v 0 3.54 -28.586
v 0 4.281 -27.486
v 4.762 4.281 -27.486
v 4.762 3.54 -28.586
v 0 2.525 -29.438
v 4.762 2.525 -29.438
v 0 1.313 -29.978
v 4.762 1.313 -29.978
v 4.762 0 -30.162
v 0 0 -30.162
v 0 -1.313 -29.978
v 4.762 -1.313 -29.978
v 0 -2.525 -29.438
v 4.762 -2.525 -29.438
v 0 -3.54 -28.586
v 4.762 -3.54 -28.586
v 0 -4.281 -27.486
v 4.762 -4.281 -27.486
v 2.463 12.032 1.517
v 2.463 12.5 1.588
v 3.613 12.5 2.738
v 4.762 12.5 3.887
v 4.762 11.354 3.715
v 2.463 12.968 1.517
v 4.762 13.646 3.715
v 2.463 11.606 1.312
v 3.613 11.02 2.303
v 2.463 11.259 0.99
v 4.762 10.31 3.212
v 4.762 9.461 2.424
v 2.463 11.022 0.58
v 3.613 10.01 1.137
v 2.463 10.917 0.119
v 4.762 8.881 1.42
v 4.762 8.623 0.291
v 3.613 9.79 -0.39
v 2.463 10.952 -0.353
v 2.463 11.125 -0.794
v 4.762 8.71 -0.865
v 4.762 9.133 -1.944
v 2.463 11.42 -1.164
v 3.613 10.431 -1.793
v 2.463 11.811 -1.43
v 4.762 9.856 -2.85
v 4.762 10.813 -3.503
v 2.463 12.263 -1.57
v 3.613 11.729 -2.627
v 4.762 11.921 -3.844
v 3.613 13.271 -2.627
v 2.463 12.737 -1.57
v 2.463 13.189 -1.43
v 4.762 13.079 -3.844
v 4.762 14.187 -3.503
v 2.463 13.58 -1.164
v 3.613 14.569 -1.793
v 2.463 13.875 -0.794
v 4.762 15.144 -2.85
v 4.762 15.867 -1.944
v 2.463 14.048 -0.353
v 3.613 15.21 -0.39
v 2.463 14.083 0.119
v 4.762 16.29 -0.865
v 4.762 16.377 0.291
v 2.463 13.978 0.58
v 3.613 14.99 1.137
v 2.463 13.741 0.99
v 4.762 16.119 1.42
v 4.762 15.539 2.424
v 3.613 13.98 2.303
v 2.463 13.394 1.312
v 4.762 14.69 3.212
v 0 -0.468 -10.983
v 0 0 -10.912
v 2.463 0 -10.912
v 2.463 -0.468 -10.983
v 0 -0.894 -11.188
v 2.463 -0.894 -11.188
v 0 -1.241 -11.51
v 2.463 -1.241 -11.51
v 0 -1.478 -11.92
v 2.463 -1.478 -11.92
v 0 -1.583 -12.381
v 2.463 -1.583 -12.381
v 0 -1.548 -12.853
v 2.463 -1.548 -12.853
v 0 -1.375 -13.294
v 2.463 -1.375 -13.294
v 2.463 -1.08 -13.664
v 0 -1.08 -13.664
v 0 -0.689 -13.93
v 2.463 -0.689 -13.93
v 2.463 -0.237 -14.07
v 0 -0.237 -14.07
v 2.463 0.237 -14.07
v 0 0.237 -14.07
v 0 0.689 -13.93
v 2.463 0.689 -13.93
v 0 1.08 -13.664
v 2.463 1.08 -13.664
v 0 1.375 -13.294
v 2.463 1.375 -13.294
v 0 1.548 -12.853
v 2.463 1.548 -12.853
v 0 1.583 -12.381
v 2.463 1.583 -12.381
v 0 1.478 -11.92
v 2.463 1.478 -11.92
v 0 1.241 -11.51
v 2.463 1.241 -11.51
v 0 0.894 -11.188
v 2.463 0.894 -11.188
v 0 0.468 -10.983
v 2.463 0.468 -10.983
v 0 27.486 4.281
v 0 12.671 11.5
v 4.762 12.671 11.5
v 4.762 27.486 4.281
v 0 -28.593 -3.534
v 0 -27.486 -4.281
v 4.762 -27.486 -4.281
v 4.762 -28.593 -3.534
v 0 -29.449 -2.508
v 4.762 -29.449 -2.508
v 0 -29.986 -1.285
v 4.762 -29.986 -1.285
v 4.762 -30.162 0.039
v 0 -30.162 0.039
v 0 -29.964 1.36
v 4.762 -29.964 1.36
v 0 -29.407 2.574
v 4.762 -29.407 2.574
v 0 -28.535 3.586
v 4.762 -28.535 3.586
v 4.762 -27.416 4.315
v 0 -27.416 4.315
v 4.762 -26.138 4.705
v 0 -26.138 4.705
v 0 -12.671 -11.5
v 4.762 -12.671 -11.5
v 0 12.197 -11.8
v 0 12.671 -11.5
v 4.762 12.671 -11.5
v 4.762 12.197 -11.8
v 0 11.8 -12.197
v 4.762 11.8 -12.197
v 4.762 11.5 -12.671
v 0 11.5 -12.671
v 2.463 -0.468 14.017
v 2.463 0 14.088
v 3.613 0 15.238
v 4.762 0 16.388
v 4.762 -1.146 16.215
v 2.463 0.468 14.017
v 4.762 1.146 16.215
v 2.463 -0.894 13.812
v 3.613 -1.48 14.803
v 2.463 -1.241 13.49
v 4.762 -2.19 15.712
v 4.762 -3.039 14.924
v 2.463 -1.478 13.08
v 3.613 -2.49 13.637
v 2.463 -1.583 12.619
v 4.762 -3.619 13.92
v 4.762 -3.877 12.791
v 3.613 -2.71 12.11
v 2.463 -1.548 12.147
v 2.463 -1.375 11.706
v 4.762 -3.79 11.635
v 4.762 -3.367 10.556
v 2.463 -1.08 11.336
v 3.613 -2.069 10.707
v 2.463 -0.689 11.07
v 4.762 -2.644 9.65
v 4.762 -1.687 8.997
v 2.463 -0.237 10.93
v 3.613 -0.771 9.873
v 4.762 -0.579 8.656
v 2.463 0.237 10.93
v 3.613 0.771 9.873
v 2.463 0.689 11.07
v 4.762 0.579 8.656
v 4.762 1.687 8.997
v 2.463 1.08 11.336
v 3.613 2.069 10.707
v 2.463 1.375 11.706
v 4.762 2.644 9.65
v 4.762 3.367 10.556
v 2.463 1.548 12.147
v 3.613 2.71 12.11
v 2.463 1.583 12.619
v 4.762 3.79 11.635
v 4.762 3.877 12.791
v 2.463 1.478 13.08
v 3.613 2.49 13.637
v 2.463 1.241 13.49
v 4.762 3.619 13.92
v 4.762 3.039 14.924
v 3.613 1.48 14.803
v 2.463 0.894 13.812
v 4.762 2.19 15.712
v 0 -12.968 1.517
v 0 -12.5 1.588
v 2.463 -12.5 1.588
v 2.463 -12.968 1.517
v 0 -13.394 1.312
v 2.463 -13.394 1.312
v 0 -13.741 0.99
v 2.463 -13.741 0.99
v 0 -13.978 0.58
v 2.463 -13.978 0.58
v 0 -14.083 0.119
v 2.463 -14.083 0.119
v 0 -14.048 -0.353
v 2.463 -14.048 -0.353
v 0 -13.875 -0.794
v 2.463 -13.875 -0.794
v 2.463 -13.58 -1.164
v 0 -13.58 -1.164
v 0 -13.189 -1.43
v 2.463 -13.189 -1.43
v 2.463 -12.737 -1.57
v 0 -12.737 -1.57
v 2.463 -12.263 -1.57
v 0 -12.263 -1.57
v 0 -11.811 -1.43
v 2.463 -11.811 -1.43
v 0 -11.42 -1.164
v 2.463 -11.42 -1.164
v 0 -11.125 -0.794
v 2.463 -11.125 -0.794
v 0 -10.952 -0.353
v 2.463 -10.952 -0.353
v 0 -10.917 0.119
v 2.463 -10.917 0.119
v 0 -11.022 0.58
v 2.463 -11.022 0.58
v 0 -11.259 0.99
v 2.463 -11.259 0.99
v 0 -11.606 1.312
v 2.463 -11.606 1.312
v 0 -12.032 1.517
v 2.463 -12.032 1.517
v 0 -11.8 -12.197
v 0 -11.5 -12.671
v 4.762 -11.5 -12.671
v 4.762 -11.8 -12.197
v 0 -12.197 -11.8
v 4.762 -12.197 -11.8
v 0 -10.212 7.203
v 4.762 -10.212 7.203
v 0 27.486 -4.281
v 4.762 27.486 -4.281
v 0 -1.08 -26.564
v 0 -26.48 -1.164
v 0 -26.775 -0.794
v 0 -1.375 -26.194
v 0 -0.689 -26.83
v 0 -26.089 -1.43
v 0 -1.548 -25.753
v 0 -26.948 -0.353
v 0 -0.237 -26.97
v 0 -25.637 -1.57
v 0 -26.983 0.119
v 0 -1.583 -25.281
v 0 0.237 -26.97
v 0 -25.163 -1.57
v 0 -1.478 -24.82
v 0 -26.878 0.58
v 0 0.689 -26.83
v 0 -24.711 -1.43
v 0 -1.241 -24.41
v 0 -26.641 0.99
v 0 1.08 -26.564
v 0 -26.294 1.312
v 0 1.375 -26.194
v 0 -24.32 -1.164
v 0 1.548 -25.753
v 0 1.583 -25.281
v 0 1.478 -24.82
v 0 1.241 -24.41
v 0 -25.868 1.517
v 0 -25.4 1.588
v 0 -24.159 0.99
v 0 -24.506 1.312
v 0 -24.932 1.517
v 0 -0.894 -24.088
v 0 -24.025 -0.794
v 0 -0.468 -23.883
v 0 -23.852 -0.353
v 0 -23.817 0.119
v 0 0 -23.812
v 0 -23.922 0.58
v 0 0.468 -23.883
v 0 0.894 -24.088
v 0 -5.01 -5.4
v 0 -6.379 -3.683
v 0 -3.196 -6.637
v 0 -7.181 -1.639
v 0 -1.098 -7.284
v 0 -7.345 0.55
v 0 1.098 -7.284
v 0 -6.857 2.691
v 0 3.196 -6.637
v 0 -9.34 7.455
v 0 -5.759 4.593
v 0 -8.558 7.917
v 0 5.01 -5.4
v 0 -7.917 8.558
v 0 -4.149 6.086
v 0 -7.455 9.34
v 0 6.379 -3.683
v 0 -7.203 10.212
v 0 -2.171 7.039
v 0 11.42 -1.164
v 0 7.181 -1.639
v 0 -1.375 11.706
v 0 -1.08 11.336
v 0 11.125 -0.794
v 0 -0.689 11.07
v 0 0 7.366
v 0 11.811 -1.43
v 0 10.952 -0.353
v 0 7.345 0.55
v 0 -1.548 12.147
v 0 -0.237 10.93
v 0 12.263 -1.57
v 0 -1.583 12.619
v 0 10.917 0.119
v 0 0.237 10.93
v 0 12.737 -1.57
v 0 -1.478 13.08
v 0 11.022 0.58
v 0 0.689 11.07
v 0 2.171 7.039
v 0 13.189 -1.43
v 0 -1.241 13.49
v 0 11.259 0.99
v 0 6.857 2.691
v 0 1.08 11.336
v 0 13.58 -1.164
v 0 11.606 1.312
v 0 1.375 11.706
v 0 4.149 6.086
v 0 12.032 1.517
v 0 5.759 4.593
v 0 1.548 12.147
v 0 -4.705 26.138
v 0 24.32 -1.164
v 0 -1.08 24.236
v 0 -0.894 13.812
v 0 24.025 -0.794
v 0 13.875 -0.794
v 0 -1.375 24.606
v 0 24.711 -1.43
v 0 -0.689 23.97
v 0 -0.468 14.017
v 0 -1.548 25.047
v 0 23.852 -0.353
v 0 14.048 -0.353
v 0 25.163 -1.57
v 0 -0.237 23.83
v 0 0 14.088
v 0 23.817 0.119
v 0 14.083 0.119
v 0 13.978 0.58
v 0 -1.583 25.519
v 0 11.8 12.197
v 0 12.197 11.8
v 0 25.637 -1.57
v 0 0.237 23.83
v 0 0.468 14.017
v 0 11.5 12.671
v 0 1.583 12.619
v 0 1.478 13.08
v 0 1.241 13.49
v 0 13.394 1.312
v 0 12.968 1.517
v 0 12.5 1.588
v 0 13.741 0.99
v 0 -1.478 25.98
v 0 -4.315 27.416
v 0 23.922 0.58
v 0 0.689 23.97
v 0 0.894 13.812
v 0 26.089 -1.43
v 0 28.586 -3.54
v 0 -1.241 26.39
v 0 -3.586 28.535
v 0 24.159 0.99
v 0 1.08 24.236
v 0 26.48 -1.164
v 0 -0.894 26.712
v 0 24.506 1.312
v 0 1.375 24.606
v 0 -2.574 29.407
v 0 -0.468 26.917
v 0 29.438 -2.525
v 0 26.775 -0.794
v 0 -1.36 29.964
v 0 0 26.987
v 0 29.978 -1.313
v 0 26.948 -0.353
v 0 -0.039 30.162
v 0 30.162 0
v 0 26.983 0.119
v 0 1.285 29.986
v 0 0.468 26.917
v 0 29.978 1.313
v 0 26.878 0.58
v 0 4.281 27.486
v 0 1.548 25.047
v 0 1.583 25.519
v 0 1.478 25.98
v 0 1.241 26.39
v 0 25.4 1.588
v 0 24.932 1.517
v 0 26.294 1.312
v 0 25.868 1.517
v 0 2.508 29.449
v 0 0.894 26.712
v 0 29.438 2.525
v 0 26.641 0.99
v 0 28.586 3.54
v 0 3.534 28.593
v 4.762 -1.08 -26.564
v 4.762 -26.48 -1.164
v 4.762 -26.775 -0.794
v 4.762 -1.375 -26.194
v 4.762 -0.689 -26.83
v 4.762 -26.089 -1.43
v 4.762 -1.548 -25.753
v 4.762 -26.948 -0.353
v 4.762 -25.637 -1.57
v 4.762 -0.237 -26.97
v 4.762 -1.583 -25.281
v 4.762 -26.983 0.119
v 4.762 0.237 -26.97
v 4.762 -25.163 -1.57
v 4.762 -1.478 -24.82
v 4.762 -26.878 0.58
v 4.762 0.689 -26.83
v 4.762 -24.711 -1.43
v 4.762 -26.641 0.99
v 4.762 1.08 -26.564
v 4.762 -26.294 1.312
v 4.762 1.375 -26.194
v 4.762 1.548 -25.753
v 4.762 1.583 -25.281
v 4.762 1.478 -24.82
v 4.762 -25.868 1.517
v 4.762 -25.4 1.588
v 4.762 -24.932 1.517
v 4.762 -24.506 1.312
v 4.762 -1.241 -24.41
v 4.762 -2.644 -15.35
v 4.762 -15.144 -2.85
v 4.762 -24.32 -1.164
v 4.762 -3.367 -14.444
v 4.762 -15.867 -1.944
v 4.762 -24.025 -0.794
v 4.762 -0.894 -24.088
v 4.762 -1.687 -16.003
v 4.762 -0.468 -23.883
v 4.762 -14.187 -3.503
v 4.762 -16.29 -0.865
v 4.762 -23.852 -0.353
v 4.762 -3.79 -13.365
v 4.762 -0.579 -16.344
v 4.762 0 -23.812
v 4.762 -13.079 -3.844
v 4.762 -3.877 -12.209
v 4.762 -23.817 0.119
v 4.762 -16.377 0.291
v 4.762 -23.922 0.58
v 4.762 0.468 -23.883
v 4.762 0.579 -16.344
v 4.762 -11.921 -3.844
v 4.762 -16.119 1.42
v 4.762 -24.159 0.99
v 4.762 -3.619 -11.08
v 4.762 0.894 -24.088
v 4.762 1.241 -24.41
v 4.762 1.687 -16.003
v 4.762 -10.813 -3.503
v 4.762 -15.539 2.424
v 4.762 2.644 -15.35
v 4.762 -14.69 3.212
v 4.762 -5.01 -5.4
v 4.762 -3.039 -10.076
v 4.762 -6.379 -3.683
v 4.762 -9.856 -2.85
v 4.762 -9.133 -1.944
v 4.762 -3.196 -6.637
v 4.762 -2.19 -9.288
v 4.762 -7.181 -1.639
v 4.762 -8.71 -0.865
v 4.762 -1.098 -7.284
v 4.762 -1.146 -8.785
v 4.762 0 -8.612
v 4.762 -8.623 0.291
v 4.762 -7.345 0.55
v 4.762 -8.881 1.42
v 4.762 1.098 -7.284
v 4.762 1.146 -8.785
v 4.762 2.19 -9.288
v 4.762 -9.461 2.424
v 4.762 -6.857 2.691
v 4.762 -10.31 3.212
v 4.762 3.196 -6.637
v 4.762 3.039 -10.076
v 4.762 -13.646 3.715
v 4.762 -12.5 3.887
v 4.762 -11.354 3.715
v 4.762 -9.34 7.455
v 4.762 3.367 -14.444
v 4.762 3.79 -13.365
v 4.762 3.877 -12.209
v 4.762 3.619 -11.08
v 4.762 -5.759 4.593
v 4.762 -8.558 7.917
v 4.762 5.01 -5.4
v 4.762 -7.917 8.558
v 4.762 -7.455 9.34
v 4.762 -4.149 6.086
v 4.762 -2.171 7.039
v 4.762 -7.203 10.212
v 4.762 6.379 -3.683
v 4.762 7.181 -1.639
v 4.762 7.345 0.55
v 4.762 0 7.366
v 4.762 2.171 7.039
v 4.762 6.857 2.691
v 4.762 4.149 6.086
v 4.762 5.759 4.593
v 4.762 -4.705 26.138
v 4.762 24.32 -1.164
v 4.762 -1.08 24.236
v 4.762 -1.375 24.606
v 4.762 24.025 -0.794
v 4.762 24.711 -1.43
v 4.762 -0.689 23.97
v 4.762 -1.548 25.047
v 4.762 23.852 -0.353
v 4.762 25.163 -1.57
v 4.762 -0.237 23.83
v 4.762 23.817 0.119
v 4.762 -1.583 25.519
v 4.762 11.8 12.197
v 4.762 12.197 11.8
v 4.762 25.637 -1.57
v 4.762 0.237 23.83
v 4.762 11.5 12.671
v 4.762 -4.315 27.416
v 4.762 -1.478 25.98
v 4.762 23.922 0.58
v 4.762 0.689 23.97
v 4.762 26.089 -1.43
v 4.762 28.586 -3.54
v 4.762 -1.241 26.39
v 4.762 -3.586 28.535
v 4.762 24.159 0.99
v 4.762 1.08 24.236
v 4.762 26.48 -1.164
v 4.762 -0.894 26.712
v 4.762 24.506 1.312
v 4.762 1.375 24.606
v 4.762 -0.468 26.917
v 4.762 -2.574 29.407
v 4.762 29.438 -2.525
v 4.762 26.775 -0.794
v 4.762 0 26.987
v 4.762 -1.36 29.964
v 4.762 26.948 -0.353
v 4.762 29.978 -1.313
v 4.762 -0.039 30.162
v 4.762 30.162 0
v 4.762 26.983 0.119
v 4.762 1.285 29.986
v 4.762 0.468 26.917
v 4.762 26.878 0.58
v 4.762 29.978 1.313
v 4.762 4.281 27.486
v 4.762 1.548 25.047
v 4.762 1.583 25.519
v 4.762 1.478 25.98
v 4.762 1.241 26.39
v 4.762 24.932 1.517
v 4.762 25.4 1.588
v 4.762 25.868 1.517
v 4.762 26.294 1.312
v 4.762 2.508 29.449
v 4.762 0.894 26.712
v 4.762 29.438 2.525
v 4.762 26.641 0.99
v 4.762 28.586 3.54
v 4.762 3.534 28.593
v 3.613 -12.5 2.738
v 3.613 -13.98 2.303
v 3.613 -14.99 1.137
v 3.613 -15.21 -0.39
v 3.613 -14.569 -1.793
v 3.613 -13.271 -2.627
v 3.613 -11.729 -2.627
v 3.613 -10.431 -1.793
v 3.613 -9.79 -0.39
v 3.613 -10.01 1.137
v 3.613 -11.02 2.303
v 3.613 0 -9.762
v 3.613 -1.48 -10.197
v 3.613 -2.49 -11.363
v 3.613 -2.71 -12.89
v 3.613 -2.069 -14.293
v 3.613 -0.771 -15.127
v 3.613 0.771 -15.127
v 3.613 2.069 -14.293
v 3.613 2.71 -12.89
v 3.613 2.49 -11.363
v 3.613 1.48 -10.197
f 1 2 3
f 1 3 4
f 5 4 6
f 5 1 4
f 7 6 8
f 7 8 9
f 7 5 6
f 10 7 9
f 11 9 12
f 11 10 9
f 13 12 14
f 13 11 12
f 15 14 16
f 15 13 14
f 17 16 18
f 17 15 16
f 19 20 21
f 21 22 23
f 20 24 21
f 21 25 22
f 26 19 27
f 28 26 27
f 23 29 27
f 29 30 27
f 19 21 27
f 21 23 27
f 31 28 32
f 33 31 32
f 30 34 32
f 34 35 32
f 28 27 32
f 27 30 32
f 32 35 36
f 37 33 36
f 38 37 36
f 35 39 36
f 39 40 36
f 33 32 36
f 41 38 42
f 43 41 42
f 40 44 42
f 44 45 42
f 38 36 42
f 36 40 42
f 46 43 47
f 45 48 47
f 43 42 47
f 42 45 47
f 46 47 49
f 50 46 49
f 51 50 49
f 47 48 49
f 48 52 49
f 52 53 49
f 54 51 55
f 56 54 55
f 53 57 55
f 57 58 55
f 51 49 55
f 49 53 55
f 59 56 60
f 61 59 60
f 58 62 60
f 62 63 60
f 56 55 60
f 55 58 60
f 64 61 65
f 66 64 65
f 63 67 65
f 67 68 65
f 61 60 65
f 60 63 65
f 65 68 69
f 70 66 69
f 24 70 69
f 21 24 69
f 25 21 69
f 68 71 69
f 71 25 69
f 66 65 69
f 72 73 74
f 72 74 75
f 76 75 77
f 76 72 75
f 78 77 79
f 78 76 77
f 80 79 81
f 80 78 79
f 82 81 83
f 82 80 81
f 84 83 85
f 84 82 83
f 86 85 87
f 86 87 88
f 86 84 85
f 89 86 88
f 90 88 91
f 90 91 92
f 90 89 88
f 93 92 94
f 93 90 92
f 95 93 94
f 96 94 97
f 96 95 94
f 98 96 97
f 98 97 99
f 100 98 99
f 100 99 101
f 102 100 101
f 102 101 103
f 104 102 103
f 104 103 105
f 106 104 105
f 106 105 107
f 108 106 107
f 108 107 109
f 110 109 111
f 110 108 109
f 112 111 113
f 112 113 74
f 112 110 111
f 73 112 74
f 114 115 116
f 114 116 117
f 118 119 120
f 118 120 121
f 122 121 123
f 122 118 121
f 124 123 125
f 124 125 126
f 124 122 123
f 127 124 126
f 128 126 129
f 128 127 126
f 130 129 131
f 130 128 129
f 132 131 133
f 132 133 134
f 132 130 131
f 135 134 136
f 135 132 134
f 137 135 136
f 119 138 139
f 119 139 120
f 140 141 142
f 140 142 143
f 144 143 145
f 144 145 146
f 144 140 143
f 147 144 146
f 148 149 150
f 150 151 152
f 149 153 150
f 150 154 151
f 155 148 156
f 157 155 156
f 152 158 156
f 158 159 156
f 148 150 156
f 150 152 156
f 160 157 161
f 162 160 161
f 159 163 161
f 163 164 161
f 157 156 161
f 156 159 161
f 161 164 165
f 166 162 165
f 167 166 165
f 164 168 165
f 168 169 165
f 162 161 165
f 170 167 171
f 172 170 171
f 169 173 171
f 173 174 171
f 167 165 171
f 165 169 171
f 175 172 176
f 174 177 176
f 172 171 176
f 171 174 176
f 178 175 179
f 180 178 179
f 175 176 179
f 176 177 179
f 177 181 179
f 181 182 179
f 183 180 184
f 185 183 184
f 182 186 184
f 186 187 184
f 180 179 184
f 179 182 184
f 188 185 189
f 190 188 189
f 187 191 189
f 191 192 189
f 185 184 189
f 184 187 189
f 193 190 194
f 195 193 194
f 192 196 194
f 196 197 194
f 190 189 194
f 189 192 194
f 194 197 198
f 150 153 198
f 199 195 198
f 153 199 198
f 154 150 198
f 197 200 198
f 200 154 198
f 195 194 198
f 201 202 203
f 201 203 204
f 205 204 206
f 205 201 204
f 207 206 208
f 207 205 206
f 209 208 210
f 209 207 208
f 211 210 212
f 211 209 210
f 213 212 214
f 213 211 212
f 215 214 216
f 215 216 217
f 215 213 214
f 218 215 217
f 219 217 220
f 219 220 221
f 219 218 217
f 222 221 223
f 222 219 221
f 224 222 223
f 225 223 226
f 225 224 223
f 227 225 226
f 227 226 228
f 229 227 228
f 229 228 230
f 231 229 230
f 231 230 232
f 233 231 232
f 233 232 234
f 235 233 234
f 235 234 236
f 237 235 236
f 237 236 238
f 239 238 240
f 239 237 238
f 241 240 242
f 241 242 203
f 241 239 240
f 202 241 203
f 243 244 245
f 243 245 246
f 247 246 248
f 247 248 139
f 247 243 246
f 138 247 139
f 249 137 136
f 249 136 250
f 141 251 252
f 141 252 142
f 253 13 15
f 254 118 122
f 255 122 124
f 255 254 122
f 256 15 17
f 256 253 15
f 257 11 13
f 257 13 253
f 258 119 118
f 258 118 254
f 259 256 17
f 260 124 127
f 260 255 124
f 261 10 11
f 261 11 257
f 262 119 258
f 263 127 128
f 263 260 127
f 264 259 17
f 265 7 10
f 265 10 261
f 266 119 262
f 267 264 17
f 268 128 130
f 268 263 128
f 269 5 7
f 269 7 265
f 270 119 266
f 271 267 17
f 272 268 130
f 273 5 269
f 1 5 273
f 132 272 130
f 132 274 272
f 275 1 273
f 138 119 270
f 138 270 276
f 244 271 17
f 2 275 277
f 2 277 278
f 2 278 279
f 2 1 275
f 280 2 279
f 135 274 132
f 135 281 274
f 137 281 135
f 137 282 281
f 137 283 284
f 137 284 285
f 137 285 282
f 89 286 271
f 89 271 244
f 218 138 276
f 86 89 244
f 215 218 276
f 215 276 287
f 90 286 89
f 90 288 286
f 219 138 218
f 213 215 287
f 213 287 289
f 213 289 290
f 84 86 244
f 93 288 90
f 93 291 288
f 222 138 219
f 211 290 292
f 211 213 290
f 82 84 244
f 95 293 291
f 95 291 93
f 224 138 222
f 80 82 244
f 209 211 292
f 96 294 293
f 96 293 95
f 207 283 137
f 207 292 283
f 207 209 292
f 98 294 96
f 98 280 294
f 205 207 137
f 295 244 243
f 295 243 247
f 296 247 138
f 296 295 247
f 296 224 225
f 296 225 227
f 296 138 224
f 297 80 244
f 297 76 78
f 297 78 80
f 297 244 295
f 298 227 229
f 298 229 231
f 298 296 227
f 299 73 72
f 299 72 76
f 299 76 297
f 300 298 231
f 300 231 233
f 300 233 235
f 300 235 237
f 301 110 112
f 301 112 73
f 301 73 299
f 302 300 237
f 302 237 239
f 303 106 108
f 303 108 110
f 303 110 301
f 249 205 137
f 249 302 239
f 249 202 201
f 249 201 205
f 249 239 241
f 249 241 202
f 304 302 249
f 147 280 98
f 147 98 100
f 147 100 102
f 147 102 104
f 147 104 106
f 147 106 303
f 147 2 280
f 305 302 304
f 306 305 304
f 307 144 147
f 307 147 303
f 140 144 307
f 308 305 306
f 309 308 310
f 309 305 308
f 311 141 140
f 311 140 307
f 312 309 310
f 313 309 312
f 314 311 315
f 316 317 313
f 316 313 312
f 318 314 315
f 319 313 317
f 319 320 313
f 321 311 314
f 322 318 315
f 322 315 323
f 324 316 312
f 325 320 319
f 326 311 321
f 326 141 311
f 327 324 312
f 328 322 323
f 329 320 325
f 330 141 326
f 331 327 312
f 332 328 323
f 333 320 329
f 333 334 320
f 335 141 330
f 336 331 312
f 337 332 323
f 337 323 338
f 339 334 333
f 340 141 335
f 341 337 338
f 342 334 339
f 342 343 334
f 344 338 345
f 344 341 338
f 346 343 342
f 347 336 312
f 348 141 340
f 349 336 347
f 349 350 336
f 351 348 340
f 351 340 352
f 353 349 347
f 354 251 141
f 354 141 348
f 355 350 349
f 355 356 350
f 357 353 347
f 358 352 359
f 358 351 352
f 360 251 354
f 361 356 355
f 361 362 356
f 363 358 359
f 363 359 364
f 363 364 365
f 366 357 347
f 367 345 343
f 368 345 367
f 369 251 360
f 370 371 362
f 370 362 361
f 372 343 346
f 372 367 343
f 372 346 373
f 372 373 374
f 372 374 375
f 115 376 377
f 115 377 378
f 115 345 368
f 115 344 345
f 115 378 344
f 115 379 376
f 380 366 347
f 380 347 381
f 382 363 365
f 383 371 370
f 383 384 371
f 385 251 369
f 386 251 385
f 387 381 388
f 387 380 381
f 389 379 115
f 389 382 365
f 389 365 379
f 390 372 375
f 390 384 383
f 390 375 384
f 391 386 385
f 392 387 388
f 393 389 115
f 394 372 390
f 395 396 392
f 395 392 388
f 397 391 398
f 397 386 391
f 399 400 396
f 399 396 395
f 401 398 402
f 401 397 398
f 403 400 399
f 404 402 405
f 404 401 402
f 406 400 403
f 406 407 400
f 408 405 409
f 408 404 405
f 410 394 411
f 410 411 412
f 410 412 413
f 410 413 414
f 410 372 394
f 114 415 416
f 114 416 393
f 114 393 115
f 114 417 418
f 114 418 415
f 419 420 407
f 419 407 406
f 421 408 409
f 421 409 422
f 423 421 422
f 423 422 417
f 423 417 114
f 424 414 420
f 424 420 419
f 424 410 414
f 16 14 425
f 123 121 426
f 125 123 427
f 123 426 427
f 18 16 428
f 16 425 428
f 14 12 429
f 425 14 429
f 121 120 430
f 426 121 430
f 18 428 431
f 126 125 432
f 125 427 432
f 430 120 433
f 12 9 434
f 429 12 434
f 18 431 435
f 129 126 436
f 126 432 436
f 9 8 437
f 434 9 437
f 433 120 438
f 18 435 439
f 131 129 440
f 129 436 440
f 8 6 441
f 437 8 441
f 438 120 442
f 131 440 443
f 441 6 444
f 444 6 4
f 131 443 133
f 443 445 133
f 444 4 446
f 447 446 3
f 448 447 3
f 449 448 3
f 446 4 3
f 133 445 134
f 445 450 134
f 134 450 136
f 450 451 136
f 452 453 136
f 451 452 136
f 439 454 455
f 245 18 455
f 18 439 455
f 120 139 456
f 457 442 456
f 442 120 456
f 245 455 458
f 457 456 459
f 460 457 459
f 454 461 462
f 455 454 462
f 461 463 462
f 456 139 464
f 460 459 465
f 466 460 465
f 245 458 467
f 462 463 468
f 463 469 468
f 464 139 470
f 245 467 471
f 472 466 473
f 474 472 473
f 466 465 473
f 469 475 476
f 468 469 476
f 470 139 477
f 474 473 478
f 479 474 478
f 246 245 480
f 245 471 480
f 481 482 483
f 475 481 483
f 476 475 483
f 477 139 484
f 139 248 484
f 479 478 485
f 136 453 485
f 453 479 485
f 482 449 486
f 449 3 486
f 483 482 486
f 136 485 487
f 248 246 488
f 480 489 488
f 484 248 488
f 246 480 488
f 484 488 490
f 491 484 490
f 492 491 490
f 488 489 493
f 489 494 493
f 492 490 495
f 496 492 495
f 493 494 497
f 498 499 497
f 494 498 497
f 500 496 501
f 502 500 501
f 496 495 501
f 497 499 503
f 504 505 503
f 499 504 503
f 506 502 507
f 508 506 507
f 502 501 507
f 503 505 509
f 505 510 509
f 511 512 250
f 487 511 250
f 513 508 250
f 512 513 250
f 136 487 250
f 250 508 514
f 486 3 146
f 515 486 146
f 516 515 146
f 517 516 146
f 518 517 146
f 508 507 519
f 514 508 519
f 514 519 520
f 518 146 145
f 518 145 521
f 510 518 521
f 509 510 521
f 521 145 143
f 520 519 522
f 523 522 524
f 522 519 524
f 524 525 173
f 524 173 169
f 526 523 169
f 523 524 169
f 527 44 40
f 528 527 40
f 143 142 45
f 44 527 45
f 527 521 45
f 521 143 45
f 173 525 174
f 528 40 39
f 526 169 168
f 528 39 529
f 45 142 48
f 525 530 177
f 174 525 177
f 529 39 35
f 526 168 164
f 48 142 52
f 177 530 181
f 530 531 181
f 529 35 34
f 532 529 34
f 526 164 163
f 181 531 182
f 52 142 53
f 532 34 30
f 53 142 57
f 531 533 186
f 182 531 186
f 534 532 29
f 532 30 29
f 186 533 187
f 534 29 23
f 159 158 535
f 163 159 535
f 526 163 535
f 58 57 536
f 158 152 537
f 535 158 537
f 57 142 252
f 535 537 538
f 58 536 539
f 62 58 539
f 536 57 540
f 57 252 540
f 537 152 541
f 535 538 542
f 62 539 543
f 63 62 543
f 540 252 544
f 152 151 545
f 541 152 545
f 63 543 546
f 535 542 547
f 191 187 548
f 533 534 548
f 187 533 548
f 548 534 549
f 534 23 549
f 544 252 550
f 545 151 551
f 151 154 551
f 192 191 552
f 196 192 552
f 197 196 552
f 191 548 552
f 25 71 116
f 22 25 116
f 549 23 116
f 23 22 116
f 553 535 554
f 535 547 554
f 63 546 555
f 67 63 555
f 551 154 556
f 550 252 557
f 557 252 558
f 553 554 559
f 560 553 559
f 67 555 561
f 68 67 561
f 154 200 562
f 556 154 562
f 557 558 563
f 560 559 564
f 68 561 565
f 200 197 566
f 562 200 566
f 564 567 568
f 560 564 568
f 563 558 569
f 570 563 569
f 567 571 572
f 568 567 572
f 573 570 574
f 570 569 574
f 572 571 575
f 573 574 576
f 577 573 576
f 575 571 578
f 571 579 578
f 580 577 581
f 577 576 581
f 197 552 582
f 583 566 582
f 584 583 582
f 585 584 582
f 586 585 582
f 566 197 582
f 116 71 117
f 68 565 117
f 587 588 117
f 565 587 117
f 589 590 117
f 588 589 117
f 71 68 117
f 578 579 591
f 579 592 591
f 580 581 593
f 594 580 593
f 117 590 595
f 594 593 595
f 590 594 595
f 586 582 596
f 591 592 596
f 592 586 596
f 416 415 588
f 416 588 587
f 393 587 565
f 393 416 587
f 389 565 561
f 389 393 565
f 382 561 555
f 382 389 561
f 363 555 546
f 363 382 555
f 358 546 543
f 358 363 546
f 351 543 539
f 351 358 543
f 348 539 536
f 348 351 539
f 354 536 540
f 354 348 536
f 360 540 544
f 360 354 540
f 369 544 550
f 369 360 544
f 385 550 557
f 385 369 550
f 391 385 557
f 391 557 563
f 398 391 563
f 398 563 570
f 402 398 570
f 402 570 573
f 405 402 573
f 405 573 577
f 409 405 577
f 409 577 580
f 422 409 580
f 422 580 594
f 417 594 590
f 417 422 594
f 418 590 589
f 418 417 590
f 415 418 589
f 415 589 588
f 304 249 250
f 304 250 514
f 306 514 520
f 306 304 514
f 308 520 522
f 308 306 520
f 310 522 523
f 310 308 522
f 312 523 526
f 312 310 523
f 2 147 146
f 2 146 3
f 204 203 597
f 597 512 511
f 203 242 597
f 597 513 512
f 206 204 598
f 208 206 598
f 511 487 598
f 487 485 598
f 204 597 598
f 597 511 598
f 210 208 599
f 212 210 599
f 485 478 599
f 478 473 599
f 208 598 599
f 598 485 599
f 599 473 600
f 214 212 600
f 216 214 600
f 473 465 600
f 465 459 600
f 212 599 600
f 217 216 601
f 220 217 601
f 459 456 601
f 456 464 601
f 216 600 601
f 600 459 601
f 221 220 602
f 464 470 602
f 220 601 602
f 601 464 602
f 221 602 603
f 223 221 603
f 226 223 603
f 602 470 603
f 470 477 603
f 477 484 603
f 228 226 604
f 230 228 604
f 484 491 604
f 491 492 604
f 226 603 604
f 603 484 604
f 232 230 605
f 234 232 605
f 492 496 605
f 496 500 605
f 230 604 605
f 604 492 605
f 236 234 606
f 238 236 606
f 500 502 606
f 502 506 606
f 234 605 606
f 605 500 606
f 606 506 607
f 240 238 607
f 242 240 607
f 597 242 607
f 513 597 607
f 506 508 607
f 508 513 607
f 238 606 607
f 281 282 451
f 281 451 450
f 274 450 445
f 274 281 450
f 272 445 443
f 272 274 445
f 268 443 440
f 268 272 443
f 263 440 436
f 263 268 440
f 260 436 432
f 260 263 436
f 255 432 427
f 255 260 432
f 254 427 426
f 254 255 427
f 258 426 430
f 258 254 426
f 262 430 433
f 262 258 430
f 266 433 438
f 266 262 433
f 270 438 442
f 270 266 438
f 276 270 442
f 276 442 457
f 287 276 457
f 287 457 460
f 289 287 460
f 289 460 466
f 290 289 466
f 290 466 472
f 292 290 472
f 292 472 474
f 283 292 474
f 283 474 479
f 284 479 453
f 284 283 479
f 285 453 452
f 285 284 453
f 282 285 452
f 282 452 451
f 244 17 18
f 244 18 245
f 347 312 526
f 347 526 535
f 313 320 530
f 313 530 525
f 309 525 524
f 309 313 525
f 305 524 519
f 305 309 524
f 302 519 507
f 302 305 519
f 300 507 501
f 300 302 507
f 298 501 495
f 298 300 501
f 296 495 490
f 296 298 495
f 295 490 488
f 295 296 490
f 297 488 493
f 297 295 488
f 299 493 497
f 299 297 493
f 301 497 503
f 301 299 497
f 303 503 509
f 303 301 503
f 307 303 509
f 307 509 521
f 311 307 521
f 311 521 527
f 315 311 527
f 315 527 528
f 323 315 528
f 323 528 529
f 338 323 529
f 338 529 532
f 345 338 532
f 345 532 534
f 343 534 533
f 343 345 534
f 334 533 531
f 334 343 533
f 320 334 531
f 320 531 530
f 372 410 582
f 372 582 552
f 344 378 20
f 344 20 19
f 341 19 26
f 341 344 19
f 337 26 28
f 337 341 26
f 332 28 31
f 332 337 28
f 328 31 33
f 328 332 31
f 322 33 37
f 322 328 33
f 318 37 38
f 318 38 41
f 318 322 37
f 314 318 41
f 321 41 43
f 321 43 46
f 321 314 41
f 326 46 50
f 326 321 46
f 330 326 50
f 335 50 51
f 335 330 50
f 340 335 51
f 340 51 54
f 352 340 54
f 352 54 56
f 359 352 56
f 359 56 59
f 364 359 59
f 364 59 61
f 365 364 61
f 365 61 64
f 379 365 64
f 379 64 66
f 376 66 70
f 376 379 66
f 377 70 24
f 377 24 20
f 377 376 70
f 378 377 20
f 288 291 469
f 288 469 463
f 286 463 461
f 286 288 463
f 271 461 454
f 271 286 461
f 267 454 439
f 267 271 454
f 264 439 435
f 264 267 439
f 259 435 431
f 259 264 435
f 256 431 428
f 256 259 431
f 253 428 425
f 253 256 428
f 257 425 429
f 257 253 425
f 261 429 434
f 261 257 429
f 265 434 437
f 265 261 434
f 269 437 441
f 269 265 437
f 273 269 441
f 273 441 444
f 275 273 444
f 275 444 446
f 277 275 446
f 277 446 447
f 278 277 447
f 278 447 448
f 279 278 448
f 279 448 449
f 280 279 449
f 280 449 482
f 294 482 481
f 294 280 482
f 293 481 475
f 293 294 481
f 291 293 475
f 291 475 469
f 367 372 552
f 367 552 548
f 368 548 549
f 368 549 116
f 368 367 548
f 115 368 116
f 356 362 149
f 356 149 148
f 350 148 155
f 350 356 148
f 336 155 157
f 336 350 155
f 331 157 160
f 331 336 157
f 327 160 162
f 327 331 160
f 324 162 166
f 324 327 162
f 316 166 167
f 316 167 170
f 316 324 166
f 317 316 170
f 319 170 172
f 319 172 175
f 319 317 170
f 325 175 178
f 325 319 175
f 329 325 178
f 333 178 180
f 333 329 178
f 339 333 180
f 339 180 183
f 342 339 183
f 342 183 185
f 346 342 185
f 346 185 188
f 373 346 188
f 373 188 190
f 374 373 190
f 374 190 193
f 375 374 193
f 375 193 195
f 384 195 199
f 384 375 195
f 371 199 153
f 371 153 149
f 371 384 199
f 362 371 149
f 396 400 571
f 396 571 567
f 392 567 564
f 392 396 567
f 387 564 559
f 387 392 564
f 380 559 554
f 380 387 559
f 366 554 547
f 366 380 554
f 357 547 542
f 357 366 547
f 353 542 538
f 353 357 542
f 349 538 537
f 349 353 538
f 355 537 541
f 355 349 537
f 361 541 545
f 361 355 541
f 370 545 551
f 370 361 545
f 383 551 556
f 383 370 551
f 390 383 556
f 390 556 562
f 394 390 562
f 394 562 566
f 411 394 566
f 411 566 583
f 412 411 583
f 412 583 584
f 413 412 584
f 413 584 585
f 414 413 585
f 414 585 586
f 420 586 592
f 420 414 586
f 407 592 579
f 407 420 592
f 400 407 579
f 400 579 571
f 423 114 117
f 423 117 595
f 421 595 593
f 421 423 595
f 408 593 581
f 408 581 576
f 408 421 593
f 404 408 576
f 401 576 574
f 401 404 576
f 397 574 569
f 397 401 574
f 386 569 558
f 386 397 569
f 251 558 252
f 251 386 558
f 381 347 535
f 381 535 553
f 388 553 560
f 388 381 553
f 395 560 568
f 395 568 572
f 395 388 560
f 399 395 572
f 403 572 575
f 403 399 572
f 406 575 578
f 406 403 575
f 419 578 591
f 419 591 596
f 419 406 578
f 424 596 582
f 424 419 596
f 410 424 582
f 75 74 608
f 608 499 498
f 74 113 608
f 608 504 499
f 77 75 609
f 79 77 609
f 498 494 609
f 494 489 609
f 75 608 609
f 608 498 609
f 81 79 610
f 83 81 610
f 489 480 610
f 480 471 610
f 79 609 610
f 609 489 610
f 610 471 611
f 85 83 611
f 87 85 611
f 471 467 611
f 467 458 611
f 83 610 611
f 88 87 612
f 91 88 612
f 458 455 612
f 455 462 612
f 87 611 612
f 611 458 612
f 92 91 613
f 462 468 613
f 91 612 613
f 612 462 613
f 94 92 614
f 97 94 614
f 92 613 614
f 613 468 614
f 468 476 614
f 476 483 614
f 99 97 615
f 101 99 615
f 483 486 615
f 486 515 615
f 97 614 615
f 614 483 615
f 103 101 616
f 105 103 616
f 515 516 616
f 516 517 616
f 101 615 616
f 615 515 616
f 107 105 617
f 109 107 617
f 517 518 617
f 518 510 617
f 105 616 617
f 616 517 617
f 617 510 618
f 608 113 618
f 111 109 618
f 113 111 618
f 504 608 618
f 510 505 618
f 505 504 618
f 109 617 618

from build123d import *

# Parameters (mm, degrees)
SKETCH1_R           = 7.366
SKETCH1_R_2         = 1.5875
BOSS_EXTRUDE1_DEPTH = 4.7625
CHAMFER1_SIZE       = 2.3


with BuildPart() as part:
    # Sketch1 → Boss-Extrude1 (new body)
    with BuildSketch(Plane(origin=(0, 0, 0), x_dir=(0, 0, -1), z_dir=(1, 0, 0))):
        with BuildLine():
            Line((4.281323883, 27.486066169), (11.500019866, 12.67082398))
            ThreePointArc((11.500019866, 12.67082398), (11.987341379, 11.987341379), (12.67082398, 11.500019866))
            Line((12.67082398, 11.500019866), (27.486066169, 4.281323883))
            ThreePointArc((27.486066169, 4.281323883), (30.1625, 0), (27.486066169, -4.281323883))
            Line((27.486066169, -4.281323883), (12.67082398, -11.500019866))
            ThreePointArc((12.67082398, -11.500019866), (11.987341379, -11.987341379), (11.500019866, -12.67082398))
            Line((11.500019866, -12.67082398), (4.281323883, -27.486066169))
            ThreePointArc((4.281323883, -27.486066169), (-0.706534615, -30.109799899), (-4.704972325, -26.137998423))
            Line((-4.704972325, -26.137998423), (-7.203117872, -10.211533956))
            ThreePointArc((-7.203117872, -10.211533956), (-8.217337882, -8.217337882), (-10.211533956, -7.203117872))
            Line((-10.211533956, -7.203117872), (-26.137998423, -4.704972325))
            ThreePointArc((-26.137998423, -4.704972325), (-30.109799899, -0.706534615), (-27.486066169, 4.281323883))
            Line((-27.486066169, 4.281323883), (-12.67082398, 11.500019866))
            ThreePointArc((-12.67082398, 11.500019866), (-11.987341379, 11.987341379), (-11.500019866, 12.67082398))
            Line((-11.500019866, 12.67082398), (-4.281323883, 27.486066169))
            ThreePointArc((-4.281323883, 27.486066169), (0, 30.1625), (4.281323883, 27.486066169))
        make_face()
        with Locations(Location((0, 0, 0), (0, 0, 180))):
            Circle(SKETCH1_R, mode=Mode.SUBTRACT)
        with Locations(Location((0, 25.4, 0), (0, 0, 180))):
            Circle(SKETCH1_R_2, mode=Mode.SUBTRACT)
        with Locations(Location((0, 12.5, 0), (0, 0, 180))):
            Circle(SKETCH1_R_2, mode=Mode.SUBTRACT)
        with Locations(Location((12.5, 0, 0), (0, 0, 180))):
            Circle(SKETCH1_R_2, mode=Mode.SUBTRACT)
        with Locations(Location((25.4, 0, 0), (0, 0, 180))):
            Circle(SKETCH1_R_2, mode=Mode.SUBTRACT)
        with Locations(Location((0, -12.5, 0), (0, 0, 180))):
            Circle(SKETCH1_R_2, mode=Mode.SUBTRACT)
        with Locations(Location((0, -25.4, 0), (0, 0, 180))):
            Circle(SKETCH1_R_2, mode=Mode.SUBTRACT)
        with Locations(Location((-12.5, 0, 0), (0, 0, 180))):
            Circle(SKETCH1_R_2, mode=Mode.SUBTRACT)
        with Locations(Location((-25.4, 0, 0), (0, 0, 180))):
            Circle(SKETCH1_R_2, mode=Mode.SUBTRACT)
    extrude(amount=BOSS_EXTRUDE1_DEPTH)

    # Chamfer1
    chamfer1_edges = [part.edges().sort_by_distance(p)[0] for p in [
        (4.7625, 0, -14.0875),
        (4.7625, 12.5, -1.5875),
        (4.7625, 0, 10.9125),
        (4.7625, -12.5, -1.5875),
    ]]
    chamfer(chamfer1_edges, length=CHAMFER1_SIZE)


solid = part.part
